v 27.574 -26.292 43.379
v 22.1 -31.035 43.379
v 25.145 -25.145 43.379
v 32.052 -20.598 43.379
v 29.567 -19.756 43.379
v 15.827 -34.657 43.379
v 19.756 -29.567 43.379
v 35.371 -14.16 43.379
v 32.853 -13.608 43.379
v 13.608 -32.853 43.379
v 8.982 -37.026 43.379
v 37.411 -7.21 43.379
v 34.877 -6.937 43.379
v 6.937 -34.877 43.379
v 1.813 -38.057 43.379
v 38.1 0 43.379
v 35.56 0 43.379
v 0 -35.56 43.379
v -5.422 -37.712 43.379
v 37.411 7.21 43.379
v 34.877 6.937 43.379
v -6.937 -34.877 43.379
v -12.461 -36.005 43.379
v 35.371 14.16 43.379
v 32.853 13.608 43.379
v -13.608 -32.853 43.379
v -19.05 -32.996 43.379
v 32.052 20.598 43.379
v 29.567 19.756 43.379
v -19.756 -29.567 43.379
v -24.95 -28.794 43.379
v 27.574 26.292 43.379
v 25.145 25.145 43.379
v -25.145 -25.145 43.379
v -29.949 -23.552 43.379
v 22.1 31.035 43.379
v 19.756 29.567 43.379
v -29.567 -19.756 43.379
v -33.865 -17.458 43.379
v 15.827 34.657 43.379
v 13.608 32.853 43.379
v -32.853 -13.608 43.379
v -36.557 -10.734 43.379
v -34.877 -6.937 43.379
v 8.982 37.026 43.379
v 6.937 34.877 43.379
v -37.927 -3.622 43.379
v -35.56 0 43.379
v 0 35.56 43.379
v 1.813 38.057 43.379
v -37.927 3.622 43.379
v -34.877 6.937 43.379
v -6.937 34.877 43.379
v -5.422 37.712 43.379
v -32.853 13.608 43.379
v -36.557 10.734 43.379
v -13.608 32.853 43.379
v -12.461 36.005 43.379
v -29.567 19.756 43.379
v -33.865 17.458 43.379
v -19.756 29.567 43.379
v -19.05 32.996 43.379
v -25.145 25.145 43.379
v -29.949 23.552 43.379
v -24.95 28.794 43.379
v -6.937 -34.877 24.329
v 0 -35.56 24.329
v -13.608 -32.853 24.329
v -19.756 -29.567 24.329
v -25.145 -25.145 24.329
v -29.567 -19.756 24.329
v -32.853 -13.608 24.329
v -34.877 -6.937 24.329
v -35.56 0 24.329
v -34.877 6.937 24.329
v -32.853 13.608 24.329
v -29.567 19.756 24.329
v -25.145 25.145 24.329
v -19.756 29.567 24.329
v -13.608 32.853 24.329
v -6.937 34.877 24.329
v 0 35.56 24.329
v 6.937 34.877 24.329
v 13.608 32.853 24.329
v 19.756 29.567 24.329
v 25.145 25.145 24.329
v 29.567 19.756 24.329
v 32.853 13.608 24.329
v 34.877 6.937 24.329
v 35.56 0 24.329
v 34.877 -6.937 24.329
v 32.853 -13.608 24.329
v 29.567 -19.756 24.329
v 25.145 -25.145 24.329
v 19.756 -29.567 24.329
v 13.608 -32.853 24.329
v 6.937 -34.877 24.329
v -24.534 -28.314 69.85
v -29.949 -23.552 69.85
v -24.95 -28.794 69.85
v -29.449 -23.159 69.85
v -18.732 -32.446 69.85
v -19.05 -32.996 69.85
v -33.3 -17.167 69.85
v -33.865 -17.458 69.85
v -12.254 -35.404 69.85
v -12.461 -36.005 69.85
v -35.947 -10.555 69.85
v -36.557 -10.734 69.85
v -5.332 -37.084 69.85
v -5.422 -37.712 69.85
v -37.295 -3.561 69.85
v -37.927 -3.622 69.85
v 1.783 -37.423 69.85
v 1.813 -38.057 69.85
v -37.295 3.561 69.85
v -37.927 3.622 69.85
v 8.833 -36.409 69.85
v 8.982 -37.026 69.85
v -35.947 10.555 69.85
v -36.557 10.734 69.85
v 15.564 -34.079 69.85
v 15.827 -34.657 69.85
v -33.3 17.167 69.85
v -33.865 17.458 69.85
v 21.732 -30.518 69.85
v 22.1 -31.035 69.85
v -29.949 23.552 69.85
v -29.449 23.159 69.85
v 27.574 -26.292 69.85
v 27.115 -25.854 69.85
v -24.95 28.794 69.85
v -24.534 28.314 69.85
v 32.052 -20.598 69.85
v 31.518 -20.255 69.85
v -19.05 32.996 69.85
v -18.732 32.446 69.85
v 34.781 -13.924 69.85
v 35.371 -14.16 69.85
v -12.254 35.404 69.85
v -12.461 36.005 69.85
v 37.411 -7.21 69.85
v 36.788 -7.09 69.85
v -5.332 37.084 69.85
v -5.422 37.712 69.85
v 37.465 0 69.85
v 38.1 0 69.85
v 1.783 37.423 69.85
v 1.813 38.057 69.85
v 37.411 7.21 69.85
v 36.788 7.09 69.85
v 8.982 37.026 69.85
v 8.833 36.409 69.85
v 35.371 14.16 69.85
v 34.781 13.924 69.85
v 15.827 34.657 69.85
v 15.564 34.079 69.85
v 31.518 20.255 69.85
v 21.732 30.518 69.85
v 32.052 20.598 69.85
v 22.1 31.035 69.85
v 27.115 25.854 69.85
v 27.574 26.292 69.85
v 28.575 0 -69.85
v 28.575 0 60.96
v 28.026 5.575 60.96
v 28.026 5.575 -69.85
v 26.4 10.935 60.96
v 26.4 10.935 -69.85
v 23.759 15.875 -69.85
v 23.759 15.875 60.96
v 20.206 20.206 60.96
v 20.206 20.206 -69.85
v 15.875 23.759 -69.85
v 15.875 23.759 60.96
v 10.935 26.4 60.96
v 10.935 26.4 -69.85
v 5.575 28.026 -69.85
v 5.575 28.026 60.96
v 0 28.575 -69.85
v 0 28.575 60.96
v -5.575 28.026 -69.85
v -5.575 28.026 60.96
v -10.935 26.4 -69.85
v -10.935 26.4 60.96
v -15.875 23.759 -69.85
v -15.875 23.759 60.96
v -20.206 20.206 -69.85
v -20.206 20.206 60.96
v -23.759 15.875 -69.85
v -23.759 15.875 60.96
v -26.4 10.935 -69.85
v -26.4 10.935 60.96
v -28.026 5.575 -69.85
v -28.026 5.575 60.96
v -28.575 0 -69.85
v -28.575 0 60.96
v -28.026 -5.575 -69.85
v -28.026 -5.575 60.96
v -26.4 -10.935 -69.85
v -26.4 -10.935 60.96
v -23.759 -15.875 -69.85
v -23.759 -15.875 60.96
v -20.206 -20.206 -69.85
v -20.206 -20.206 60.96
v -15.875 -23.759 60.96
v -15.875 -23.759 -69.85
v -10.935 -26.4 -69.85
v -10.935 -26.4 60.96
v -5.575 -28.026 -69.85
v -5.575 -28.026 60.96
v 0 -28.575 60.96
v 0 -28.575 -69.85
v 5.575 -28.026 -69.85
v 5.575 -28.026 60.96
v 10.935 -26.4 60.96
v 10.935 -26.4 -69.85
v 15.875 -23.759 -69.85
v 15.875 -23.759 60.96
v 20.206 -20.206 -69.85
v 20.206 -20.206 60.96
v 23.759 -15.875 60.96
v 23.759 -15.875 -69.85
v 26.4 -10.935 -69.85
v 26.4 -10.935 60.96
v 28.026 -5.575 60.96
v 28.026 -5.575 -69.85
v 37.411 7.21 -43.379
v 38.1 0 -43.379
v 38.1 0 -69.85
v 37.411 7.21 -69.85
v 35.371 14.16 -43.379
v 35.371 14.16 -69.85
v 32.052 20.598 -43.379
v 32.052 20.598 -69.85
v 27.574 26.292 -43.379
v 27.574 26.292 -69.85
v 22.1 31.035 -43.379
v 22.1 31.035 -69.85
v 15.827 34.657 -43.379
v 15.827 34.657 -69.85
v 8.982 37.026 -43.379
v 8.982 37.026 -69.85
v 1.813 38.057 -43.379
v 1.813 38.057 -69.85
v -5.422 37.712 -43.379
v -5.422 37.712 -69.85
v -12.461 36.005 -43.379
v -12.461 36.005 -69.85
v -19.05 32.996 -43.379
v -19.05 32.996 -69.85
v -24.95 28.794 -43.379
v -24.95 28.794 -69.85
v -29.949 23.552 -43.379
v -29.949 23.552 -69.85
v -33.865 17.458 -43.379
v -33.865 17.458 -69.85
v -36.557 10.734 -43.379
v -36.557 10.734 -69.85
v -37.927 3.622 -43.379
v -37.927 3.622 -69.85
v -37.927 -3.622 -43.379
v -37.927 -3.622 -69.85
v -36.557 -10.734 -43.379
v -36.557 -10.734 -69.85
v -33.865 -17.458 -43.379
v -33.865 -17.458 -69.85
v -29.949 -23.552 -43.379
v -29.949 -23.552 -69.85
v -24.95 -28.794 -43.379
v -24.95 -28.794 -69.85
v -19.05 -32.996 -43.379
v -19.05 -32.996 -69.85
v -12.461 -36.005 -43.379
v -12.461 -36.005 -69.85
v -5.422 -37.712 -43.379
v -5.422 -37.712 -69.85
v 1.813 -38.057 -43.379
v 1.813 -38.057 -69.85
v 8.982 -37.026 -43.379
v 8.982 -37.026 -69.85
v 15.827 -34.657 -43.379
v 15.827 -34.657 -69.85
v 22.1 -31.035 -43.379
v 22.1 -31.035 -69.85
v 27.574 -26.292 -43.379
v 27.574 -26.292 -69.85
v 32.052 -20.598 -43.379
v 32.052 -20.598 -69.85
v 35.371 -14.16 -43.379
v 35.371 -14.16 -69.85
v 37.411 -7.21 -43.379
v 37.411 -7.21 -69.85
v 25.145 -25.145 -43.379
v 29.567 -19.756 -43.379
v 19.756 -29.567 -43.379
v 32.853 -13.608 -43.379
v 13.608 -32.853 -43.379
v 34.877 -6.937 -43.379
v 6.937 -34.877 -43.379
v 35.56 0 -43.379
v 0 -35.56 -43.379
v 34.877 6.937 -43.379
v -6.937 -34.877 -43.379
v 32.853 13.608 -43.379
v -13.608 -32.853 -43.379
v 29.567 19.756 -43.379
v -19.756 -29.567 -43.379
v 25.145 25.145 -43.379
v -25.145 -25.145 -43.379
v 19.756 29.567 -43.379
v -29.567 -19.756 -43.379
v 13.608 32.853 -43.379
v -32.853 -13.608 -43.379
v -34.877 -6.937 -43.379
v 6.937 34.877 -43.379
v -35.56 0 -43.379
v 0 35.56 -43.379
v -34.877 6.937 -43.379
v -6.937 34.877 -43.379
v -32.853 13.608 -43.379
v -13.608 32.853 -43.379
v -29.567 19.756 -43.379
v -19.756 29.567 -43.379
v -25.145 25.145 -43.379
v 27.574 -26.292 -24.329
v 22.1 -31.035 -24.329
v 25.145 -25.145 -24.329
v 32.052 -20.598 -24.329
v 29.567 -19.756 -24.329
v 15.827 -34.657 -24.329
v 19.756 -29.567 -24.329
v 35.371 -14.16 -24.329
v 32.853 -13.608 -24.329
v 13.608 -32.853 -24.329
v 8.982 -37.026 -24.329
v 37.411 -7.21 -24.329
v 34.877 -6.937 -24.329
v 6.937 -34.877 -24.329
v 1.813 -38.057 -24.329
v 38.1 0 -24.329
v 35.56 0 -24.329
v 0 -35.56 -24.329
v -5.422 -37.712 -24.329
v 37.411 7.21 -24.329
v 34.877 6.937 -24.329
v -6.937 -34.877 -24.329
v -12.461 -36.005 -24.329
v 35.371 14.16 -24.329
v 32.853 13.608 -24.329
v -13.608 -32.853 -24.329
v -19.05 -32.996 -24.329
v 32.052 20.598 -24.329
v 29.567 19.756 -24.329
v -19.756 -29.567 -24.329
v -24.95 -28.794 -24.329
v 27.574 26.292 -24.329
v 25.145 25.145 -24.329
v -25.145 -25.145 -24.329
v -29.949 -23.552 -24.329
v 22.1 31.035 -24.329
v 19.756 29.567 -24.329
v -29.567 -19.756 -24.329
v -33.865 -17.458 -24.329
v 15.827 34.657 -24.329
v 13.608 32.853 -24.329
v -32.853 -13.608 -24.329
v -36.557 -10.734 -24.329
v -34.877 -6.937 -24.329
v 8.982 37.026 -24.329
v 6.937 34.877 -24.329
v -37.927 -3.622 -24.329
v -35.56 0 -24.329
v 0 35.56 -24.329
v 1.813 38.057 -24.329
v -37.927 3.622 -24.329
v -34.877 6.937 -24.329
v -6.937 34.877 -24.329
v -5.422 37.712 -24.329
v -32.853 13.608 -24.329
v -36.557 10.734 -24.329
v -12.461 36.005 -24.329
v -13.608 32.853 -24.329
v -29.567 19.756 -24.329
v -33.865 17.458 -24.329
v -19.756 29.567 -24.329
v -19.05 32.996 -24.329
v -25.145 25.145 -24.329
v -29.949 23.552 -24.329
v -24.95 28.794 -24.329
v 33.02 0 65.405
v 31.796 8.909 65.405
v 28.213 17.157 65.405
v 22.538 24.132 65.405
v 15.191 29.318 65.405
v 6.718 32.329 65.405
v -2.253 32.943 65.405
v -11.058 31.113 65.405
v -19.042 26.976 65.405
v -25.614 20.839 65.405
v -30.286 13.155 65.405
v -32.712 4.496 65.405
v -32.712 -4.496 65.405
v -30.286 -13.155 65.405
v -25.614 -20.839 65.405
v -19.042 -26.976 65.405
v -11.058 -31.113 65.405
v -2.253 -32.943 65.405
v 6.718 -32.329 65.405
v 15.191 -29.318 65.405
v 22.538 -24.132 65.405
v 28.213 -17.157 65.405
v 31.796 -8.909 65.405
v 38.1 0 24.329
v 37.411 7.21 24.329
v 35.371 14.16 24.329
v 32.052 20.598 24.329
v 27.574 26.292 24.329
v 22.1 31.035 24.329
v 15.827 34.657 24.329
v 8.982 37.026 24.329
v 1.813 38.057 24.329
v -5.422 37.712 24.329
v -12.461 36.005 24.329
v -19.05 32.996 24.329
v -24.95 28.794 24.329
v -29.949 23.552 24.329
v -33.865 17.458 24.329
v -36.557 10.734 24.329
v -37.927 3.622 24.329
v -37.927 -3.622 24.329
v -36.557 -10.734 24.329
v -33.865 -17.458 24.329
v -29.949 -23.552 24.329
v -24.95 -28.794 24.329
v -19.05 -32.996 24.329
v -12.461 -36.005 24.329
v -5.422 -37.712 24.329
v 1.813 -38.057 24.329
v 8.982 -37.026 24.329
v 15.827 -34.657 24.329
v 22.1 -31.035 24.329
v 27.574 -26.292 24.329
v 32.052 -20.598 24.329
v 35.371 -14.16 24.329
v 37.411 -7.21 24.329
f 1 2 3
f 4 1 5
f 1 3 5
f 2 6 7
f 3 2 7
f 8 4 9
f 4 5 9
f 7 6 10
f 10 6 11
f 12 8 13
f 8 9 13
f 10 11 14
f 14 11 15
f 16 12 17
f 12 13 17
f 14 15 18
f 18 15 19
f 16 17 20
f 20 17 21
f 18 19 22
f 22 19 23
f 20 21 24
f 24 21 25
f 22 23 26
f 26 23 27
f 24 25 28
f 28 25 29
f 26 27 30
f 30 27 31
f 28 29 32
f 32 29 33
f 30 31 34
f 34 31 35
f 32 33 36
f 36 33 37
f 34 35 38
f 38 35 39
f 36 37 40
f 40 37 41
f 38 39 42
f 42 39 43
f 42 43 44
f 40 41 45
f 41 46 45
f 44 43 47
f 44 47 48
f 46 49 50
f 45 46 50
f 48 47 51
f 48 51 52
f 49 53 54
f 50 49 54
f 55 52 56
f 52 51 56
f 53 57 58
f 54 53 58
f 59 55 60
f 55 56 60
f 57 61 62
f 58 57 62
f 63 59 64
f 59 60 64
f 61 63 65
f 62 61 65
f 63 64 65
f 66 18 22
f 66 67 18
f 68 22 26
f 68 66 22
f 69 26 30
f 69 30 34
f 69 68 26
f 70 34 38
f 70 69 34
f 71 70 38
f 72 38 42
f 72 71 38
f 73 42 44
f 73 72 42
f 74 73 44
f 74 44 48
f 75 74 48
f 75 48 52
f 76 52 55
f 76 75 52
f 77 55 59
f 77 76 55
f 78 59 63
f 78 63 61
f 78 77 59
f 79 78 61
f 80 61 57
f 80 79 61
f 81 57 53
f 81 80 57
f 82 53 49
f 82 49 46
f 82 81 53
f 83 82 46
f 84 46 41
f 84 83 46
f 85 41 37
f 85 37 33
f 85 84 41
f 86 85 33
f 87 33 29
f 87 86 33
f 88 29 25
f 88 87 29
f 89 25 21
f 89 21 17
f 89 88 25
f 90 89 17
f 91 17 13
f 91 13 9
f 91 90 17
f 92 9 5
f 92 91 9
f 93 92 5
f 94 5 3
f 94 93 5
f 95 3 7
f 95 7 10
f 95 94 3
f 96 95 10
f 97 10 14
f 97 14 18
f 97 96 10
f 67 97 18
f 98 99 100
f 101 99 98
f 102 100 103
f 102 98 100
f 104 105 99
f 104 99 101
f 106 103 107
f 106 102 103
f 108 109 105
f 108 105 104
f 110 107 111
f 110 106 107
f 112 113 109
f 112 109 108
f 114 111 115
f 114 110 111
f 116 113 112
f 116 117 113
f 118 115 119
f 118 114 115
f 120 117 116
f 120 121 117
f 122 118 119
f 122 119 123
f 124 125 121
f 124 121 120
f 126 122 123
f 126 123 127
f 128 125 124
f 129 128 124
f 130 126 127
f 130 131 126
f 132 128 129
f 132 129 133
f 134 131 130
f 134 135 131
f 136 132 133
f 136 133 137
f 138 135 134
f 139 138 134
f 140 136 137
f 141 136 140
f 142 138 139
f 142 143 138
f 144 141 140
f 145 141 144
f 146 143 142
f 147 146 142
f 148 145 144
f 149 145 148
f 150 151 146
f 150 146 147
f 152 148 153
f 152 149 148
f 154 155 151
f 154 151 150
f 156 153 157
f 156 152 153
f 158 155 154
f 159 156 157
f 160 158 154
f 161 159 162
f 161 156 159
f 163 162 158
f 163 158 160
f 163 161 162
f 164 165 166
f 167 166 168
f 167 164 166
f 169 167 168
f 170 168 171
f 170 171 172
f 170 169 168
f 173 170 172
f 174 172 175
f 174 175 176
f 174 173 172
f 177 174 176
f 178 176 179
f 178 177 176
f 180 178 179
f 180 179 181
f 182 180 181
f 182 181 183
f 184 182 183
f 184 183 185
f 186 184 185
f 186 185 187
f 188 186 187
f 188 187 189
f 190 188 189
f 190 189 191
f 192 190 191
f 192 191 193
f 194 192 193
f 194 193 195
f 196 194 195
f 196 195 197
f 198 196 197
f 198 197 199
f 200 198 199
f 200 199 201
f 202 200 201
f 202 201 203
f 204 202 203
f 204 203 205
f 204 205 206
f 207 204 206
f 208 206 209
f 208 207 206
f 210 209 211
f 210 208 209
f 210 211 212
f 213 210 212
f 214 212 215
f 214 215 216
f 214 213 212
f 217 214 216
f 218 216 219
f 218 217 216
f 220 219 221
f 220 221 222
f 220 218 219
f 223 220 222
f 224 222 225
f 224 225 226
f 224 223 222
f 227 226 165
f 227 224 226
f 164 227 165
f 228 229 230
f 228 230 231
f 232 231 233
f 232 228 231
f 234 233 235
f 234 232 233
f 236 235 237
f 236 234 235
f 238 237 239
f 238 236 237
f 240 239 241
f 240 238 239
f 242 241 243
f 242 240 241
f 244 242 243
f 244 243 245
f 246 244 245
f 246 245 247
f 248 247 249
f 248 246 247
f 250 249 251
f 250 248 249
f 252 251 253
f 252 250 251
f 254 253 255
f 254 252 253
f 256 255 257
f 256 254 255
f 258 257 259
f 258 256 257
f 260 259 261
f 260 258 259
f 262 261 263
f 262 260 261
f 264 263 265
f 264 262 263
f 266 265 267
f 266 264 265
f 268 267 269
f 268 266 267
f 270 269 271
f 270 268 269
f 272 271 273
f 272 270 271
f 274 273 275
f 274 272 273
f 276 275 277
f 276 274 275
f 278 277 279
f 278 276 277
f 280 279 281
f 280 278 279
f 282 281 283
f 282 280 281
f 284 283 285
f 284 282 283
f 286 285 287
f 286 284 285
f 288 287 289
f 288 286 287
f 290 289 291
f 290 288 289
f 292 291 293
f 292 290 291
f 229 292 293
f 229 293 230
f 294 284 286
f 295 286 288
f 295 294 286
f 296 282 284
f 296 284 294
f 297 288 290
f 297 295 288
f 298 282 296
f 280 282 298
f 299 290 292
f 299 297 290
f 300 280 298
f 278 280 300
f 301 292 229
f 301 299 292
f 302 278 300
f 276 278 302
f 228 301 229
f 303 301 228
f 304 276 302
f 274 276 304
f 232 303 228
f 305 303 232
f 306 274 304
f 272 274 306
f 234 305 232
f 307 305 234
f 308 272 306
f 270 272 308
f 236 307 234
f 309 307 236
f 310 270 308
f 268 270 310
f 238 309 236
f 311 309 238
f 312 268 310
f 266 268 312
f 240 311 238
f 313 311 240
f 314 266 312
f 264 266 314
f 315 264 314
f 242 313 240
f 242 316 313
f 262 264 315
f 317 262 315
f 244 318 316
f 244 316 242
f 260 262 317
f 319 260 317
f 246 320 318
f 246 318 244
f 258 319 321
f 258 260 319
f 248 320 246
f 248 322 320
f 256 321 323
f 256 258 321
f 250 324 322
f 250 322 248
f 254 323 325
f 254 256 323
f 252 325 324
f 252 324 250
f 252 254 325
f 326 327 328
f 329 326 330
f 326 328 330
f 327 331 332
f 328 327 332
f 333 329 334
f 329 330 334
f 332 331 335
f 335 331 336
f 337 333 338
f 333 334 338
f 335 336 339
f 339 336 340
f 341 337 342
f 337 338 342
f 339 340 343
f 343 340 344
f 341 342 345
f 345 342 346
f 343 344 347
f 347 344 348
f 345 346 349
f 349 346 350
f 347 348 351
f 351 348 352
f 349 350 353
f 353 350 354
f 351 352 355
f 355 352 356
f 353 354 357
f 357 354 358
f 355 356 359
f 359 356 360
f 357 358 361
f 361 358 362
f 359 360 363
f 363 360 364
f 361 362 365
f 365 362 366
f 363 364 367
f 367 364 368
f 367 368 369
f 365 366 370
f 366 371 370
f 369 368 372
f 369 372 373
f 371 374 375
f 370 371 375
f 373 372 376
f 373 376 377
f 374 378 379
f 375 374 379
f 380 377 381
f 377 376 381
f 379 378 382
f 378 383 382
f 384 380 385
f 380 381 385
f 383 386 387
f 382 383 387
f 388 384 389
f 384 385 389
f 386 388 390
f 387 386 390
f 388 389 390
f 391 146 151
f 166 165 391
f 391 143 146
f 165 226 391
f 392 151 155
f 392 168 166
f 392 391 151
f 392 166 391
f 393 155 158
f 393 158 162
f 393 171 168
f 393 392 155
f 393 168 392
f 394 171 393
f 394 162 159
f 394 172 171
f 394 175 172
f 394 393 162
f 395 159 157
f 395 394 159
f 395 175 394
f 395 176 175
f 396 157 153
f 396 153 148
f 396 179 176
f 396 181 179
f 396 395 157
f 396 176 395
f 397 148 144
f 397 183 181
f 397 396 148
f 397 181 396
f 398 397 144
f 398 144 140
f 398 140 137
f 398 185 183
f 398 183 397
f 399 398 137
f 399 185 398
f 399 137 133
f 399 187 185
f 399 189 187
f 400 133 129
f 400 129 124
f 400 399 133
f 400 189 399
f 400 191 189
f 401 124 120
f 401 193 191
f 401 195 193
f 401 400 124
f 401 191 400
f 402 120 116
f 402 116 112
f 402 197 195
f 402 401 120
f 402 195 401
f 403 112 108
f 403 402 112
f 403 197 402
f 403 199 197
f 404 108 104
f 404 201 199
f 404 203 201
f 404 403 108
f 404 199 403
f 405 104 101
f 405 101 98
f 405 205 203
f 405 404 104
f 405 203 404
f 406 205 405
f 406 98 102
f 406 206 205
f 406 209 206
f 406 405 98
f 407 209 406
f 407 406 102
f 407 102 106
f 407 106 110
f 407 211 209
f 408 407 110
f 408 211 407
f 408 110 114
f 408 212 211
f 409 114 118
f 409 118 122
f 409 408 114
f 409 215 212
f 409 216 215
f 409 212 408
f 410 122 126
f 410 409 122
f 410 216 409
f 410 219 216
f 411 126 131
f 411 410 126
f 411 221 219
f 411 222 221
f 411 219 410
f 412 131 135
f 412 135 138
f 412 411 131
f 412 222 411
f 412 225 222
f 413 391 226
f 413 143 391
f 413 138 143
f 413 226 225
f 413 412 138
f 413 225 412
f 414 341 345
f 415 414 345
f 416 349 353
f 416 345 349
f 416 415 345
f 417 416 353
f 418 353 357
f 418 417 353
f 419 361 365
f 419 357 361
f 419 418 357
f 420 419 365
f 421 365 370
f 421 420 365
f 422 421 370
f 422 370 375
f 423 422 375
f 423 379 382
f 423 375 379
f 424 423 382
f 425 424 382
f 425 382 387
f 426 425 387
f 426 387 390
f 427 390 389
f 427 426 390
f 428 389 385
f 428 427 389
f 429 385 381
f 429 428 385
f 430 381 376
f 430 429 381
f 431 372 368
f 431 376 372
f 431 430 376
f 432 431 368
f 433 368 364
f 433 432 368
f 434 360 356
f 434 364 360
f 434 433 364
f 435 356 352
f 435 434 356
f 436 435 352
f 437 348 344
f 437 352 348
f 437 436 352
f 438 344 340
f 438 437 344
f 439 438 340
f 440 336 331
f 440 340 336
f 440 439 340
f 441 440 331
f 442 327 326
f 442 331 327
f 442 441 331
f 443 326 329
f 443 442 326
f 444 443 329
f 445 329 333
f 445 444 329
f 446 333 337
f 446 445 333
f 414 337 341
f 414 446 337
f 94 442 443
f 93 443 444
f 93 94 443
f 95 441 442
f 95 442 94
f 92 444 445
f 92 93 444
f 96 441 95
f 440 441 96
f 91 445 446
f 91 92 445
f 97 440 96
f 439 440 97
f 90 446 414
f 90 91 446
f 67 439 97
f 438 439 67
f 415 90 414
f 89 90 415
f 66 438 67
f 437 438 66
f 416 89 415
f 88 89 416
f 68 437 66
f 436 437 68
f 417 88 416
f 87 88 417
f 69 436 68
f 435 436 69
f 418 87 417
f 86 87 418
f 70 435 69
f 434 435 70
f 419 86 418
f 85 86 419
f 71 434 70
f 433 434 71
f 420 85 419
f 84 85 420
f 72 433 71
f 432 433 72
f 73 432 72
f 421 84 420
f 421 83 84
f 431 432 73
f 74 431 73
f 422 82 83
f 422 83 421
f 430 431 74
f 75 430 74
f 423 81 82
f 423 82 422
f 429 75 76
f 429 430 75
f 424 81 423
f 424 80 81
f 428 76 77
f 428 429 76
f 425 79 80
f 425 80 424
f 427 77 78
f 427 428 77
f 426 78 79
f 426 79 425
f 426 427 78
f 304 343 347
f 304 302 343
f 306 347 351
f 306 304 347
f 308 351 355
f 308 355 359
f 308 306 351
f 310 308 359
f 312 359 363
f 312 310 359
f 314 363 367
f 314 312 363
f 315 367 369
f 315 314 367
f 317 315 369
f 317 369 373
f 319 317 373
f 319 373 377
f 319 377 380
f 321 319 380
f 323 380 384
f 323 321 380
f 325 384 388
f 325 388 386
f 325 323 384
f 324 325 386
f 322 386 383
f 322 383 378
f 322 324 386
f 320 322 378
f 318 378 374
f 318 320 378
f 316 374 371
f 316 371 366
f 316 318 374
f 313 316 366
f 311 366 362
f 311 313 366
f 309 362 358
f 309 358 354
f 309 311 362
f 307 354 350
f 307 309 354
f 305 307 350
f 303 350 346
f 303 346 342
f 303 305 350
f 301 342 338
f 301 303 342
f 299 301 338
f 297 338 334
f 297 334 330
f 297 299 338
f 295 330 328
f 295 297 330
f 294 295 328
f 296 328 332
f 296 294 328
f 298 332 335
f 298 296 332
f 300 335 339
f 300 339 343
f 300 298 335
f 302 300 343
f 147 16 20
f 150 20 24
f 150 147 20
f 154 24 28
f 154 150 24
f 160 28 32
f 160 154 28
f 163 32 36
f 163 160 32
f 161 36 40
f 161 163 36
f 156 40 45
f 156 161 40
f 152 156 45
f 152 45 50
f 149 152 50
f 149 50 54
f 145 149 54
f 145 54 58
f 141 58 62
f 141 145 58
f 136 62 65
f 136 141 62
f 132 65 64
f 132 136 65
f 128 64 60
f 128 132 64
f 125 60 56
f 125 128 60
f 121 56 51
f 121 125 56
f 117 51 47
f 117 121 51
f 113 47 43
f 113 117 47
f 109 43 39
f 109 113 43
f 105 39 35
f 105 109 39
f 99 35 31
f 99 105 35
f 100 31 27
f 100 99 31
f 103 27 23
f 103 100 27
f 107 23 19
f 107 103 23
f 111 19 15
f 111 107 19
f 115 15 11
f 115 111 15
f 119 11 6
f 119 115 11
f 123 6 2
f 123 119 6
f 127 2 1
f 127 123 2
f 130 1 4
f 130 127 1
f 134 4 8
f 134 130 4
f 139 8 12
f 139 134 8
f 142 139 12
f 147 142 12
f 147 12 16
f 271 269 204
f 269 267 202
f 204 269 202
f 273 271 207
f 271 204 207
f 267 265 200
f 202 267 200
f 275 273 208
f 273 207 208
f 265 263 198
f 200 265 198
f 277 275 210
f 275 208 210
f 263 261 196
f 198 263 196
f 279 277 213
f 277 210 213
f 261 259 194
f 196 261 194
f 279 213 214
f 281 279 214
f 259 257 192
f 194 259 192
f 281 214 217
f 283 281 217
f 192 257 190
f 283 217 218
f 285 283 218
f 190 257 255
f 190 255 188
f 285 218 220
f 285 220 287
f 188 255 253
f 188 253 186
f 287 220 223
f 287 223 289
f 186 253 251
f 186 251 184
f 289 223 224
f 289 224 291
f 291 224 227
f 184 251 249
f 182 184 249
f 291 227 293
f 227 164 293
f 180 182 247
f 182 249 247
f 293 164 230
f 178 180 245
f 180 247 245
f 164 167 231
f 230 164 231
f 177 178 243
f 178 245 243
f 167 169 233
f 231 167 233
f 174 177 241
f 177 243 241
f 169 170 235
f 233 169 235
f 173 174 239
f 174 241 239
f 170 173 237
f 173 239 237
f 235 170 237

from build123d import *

# Parameters (mm, degrees)
SKETCH3_R           = 38.1
SKETCH3_R_2         = 28.575
BOSS_EXTRUDE1_DEPTH = 69.85
SKETCH4_W           = 19.05
SKETCH4_H           = 2.54
CHAMFER1_SIZE       = 8.89


with BuildPart() as part:
    # Sketch3 → Boss-Extrude1 (new, symmetric)
    with BuildSketch(Plane.XY):
        Circle(SKETCH3_R)
        Circle(SKETCH3_R_2, mode=Mode.SUBTRACT)
    extrude(amount=BOSS_EXTRUDE1_DEPTH, both=True)

    # Sketch4 → Cut-Revolve1 (revolve, cut)
    with BuildSketch(Plane(origin=(0, 0, 0), x_dir=(0, 0, -1), z_dir=(1, 0, 0)), mode=Mode.PRIVATE) as cut_revolve1_sk:
        with Locations((-33.853856194, 36.83)):
            Rectangle(SKETCH4_W, SKETCH4_H)
        with Locations((33.853856194, 36.83)):
            Rectangle(SKETCH4_W, SKETCH4_H)
    revolve(cut_revolve1_sk.sketch.rotate(Axis((0, 0, 69.85), (0, 0, -1)), 180), axis=Axis((0, 0, 69.85), (0, 0, -1)), mode=Mode.SUBTRACT)

    # Chamfer1
    chamfer1_edges = [part.edges().sort_by_distance(p)[0] for p in [
        (-28.575, 0, 69.85),
    ]]
    chamfer(chamfer1_edges, length=CHAMFER1_SIZE)


solid = part.part
